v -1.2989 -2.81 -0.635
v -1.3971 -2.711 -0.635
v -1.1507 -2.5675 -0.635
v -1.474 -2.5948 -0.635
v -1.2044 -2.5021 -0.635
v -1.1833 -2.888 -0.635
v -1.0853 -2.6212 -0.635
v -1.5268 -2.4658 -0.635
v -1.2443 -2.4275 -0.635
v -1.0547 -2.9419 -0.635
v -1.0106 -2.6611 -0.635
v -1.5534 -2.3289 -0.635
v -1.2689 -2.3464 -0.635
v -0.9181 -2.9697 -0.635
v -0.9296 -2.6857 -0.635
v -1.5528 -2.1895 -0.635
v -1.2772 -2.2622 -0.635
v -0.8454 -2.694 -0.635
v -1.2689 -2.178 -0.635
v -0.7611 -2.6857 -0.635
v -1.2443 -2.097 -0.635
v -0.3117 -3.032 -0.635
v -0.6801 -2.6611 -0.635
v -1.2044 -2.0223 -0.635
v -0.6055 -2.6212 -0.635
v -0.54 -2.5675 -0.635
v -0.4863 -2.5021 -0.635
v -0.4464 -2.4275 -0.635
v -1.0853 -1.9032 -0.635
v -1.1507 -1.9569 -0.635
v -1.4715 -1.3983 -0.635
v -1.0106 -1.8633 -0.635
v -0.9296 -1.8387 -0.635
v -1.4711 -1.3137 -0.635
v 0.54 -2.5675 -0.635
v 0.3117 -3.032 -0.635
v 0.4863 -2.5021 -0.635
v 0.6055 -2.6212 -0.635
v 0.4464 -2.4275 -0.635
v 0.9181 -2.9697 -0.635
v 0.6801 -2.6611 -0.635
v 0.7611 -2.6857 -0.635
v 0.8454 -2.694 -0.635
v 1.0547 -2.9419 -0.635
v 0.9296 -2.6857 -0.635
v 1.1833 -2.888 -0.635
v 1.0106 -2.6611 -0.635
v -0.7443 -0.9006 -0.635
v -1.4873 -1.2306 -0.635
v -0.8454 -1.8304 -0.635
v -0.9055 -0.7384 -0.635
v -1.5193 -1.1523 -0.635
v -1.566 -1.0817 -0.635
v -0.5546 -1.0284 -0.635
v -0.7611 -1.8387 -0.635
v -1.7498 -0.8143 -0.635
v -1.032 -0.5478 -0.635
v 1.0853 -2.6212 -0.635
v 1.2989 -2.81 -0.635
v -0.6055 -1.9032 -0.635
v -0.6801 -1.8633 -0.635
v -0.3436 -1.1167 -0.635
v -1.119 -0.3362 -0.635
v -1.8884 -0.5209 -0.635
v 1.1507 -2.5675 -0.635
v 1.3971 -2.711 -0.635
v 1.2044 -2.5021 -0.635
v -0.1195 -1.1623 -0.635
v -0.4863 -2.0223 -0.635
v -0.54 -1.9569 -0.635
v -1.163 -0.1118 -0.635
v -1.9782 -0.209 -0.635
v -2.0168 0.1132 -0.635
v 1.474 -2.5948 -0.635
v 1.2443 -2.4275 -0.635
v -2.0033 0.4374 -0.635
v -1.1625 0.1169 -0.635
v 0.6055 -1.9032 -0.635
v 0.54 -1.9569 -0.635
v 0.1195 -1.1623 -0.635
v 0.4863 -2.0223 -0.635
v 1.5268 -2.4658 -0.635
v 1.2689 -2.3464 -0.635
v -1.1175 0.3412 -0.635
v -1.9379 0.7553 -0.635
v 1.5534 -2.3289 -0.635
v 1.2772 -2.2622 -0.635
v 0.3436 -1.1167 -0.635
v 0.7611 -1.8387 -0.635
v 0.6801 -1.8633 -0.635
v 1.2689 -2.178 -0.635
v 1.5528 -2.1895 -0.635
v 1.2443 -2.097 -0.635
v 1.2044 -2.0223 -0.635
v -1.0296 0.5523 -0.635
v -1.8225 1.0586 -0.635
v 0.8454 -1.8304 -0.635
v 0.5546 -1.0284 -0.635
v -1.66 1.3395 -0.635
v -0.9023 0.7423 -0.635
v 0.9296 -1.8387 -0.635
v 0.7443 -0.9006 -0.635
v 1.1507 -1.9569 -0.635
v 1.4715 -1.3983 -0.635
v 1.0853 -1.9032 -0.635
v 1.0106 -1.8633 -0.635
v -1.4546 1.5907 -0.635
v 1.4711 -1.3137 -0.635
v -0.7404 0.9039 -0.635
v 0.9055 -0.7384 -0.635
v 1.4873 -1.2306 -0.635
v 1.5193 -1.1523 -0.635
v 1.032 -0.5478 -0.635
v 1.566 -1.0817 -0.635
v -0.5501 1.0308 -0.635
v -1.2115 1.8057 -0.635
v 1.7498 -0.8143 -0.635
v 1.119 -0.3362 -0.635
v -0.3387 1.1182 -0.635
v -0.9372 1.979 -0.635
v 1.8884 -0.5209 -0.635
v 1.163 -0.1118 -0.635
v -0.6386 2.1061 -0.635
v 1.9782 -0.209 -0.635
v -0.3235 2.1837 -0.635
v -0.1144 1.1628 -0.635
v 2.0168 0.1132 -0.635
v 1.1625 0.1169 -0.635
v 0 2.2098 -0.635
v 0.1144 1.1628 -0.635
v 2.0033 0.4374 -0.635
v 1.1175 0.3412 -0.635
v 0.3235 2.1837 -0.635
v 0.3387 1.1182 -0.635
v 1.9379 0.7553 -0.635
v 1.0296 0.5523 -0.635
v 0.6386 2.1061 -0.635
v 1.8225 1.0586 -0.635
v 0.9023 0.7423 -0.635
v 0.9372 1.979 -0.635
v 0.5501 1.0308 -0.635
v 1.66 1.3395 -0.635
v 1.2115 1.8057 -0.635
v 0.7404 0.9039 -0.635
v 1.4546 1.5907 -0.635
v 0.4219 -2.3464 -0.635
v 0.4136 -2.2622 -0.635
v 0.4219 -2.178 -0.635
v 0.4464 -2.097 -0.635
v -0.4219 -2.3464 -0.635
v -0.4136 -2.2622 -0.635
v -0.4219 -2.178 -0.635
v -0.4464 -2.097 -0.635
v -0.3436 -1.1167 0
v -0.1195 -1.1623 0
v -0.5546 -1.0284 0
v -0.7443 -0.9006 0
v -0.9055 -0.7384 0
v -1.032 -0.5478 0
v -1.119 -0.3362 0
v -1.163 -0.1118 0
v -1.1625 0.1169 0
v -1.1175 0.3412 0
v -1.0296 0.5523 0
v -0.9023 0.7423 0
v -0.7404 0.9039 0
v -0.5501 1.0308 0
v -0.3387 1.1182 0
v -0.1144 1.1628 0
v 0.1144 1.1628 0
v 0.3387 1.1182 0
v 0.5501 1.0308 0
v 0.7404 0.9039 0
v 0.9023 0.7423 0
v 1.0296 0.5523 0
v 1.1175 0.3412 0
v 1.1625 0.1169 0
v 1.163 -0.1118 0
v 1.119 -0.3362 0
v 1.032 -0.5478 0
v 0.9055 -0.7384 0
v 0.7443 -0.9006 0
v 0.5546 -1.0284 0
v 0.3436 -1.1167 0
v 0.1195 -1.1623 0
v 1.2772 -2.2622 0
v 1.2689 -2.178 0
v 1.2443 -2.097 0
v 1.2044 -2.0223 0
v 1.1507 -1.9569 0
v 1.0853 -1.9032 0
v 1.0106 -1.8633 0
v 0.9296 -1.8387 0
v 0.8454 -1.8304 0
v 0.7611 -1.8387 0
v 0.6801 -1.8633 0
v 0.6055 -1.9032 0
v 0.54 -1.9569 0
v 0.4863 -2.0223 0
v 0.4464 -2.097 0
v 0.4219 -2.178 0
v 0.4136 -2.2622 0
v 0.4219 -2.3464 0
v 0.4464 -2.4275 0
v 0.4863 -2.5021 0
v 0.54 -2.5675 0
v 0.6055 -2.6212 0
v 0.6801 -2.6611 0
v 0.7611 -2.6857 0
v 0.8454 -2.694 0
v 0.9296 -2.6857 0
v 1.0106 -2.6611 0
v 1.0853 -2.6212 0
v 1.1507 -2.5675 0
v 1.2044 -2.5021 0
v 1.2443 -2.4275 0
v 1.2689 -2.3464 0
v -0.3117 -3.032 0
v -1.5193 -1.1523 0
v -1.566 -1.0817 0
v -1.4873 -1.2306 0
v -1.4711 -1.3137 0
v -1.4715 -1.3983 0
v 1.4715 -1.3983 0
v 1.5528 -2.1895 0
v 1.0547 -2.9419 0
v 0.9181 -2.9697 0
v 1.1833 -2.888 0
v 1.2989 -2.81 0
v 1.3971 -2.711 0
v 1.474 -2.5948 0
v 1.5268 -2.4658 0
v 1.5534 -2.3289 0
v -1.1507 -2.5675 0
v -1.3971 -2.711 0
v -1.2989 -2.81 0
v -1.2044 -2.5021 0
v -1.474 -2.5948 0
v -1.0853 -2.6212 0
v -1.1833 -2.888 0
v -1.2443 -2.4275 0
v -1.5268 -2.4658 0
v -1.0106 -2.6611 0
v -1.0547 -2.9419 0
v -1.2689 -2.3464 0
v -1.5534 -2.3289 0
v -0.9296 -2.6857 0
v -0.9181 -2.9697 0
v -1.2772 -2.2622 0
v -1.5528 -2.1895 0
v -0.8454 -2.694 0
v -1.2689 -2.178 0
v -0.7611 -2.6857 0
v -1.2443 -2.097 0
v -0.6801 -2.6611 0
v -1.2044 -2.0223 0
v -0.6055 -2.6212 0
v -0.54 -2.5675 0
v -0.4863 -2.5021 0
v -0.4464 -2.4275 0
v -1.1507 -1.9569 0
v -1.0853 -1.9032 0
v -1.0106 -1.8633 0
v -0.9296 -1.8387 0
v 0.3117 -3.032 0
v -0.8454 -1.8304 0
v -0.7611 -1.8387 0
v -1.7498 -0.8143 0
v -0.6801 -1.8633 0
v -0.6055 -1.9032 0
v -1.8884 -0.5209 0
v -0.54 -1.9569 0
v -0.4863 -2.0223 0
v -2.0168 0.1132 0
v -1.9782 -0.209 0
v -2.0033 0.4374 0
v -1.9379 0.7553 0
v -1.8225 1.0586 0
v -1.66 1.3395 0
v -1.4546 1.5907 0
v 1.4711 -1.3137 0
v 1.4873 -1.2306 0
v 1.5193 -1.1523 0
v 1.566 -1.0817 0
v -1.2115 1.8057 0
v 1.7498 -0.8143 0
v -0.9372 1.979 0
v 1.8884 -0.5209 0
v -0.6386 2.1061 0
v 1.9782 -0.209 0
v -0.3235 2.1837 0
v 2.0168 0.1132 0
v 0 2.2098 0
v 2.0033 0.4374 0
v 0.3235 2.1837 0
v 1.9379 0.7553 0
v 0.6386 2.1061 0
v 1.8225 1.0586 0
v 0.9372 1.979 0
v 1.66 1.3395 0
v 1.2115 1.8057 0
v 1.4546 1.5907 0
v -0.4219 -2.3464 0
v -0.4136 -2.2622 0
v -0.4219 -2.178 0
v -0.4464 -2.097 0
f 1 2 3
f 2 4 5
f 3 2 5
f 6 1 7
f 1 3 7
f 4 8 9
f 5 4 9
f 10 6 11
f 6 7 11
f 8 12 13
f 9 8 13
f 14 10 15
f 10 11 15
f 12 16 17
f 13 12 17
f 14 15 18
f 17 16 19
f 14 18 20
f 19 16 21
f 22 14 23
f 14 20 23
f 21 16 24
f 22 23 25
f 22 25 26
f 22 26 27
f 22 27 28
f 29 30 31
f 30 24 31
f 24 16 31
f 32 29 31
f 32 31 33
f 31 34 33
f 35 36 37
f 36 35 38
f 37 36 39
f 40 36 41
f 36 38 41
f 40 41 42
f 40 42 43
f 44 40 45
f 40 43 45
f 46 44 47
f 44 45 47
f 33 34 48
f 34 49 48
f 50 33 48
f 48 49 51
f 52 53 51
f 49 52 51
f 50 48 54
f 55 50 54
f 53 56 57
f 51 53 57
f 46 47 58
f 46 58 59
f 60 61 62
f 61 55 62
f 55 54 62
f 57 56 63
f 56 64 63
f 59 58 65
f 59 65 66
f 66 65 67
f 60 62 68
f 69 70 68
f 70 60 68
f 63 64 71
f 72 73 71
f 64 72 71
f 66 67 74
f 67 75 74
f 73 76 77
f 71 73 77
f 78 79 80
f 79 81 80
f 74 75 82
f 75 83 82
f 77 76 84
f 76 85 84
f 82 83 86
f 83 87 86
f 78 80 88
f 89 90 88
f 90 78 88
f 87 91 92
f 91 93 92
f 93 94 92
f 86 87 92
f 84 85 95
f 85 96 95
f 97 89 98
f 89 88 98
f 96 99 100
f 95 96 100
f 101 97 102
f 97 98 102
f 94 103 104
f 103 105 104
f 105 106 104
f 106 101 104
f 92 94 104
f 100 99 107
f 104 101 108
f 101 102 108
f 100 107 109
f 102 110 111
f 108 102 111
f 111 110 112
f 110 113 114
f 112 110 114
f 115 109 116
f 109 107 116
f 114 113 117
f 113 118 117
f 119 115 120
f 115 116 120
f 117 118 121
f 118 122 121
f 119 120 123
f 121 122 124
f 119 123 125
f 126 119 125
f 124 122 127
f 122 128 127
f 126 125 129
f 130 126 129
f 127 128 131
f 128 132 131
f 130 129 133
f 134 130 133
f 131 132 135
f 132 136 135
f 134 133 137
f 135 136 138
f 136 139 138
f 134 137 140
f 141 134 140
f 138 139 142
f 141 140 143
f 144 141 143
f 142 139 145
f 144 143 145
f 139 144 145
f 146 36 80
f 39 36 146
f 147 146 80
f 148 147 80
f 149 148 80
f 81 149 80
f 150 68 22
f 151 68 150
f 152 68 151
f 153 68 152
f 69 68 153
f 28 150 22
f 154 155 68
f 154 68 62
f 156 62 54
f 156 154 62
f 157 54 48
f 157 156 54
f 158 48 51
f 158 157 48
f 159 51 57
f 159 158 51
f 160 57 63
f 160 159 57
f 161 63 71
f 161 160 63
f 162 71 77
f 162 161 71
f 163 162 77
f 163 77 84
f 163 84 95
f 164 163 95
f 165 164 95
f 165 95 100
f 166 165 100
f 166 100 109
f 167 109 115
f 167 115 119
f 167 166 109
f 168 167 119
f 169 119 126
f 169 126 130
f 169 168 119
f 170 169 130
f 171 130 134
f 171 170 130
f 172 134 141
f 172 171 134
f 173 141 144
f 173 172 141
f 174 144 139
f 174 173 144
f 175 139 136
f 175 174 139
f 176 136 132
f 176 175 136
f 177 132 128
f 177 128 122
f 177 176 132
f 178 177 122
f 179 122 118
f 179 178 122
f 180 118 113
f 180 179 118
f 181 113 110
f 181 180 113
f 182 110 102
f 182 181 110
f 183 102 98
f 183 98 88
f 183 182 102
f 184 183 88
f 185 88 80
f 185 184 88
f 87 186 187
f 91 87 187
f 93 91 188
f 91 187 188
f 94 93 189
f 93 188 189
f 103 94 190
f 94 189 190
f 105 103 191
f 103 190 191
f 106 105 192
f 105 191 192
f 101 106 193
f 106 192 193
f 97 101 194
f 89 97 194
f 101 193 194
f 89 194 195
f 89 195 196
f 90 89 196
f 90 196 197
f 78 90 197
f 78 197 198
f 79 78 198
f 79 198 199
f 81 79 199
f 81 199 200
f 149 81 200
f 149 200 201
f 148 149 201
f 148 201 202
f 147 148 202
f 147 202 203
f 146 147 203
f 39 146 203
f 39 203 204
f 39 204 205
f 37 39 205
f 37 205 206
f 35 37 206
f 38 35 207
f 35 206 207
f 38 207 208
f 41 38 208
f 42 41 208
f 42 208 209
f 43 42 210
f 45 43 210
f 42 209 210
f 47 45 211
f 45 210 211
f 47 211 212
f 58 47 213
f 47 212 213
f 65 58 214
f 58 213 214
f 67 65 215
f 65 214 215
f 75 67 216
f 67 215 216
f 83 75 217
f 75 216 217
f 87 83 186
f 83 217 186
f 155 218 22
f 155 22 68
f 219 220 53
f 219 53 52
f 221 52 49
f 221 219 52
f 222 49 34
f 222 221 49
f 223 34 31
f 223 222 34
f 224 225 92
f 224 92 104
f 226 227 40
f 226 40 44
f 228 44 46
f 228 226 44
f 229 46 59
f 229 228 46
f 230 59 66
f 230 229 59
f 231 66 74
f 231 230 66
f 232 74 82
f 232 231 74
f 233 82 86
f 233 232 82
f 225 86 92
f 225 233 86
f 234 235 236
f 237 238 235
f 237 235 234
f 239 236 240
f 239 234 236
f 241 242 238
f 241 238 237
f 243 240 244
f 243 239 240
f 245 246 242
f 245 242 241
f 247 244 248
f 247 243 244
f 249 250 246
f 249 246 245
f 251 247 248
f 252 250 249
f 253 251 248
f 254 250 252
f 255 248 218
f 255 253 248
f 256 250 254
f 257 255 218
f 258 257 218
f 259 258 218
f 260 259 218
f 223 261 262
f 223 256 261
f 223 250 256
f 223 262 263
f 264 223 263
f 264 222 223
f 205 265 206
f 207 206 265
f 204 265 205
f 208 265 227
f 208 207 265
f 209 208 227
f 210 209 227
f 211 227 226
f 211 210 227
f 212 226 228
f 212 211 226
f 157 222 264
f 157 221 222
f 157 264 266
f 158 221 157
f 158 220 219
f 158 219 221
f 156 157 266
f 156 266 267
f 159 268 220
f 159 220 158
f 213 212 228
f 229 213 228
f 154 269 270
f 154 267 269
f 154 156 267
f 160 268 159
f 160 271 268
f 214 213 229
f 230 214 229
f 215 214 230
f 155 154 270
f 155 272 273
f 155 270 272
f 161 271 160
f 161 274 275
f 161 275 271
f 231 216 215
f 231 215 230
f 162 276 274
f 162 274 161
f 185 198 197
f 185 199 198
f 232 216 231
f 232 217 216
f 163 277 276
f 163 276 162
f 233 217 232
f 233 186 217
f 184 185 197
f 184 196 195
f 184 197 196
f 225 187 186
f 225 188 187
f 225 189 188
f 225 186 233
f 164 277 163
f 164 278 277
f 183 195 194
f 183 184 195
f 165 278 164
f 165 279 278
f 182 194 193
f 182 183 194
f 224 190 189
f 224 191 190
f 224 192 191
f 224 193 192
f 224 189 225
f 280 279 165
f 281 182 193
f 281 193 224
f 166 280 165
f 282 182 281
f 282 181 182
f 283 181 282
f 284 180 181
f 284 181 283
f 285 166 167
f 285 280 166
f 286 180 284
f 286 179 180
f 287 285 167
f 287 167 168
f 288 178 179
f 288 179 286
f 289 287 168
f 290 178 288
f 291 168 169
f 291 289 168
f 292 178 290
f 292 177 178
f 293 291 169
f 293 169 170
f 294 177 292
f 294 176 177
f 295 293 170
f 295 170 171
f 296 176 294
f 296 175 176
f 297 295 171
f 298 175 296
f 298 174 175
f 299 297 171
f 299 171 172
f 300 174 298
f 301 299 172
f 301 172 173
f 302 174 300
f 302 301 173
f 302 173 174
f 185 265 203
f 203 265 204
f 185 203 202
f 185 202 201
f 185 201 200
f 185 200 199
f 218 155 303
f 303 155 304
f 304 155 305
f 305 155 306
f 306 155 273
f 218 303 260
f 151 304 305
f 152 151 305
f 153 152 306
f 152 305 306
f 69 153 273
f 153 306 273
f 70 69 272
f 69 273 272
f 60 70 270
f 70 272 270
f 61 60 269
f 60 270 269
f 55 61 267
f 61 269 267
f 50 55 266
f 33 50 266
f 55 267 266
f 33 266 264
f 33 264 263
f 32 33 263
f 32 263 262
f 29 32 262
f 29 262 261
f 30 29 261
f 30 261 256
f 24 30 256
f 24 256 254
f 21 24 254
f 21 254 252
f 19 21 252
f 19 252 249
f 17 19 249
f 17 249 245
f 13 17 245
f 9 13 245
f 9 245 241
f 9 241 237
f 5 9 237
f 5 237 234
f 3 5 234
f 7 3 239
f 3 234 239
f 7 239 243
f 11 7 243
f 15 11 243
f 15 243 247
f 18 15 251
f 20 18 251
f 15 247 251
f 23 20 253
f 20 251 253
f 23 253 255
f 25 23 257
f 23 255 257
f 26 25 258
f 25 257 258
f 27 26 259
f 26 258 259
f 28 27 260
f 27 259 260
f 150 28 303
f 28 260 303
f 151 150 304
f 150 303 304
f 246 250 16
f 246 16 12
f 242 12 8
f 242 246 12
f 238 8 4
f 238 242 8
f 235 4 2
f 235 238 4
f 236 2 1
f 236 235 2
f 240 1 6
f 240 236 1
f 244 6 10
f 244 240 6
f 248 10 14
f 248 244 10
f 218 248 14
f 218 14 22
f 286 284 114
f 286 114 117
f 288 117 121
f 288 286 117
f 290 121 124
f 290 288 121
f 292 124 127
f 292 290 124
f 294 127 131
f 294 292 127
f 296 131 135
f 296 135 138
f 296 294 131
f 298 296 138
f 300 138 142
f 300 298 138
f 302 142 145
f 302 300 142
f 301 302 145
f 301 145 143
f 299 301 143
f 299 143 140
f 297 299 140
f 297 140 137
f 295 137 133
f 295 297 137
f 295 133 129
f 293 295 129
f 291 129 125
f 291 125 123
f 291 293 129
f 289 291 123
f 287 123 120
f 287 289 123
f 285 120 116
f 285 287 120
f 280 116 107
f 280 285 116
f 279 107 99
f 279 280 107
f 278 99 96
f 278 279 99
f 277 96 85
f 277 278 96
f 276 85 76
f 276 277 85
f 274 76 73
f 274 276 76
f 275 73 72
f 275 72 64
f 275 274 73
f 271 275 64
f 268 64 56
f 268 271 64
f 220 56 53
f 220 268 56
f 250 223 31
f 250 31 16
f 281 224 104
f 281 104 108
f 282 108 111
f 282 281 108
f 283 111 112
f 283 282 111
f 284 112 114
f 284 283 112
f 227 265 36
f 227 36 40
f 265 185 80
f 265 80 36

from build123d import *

# Parameters (mm, degrees)
BODY_DEPTH  = 0.635
HOLSKE_R    = 0.4318
HOLES_DEPTH = 4.697280077


with BuildPart() as part:
    # BodySke → Body (new body)
    with BuildSketch(Plane.XY):
        with BuildLine():
            Line((0.119485432, -1.162274405), (0.311701126, -3.032020186))
            Line((0.311701126, -3.032020186), (0.918105163, -2.969679961))
            ThreePointArc((0.918105163, -2.969679961), (1.39706077, -2.71103833), (1.552846277, -2.189478321))
            Line((1.552846277, -2.189478321), (1.471509157, -1.398285189))
            ThreePointArc((1.471509157, -1.398285189), (1.487288061, -1.230611759), (1.566008589, -1.081727806))
            ThreePointArc((1.566008589, -1.081727806), (0, 2.2098), (-1.566008589, -1.081727806))
            ThreePointArc((-1.566008589, -1.081727806), (-1.487288061, -1.230611759), (-1.471509157, -1.398285189))
            Line((-1.471509157, -1.398285189), (-1.552846277, -2.189478321))
            ThreePointArc((-1.552846277, -2.189478321), (-1.39706077, -2.71103833), (-0.918105163, -2.969679961))
            Line((-0.918105163, -2.969679961), (-0.311701126, -3.032020186))
            Line((-0.311701126, -3.032020186), (-0.119485432, -1.162274405))
            ThreePointArc((-0.119485432, -1.162274405), (0, 1.1684), (0.119485432, -1.162274405))
        make_face()
    extrude(amount=-BODY_DEPTH)

    # HolSke → Holes (cut, through all)
    with BuildSketch(Plane.XY):
        with Locations((0.8453749, -2.262208584)):
            Circle(HOLSKE_R)
        with Locations((-0.8453749, -2.262208584)):
            Circle(HOLSKE_R)
    extrude(amount=-HOLES_DEPTH, mode=Mode.SUBTRACT)


solid = part.part
